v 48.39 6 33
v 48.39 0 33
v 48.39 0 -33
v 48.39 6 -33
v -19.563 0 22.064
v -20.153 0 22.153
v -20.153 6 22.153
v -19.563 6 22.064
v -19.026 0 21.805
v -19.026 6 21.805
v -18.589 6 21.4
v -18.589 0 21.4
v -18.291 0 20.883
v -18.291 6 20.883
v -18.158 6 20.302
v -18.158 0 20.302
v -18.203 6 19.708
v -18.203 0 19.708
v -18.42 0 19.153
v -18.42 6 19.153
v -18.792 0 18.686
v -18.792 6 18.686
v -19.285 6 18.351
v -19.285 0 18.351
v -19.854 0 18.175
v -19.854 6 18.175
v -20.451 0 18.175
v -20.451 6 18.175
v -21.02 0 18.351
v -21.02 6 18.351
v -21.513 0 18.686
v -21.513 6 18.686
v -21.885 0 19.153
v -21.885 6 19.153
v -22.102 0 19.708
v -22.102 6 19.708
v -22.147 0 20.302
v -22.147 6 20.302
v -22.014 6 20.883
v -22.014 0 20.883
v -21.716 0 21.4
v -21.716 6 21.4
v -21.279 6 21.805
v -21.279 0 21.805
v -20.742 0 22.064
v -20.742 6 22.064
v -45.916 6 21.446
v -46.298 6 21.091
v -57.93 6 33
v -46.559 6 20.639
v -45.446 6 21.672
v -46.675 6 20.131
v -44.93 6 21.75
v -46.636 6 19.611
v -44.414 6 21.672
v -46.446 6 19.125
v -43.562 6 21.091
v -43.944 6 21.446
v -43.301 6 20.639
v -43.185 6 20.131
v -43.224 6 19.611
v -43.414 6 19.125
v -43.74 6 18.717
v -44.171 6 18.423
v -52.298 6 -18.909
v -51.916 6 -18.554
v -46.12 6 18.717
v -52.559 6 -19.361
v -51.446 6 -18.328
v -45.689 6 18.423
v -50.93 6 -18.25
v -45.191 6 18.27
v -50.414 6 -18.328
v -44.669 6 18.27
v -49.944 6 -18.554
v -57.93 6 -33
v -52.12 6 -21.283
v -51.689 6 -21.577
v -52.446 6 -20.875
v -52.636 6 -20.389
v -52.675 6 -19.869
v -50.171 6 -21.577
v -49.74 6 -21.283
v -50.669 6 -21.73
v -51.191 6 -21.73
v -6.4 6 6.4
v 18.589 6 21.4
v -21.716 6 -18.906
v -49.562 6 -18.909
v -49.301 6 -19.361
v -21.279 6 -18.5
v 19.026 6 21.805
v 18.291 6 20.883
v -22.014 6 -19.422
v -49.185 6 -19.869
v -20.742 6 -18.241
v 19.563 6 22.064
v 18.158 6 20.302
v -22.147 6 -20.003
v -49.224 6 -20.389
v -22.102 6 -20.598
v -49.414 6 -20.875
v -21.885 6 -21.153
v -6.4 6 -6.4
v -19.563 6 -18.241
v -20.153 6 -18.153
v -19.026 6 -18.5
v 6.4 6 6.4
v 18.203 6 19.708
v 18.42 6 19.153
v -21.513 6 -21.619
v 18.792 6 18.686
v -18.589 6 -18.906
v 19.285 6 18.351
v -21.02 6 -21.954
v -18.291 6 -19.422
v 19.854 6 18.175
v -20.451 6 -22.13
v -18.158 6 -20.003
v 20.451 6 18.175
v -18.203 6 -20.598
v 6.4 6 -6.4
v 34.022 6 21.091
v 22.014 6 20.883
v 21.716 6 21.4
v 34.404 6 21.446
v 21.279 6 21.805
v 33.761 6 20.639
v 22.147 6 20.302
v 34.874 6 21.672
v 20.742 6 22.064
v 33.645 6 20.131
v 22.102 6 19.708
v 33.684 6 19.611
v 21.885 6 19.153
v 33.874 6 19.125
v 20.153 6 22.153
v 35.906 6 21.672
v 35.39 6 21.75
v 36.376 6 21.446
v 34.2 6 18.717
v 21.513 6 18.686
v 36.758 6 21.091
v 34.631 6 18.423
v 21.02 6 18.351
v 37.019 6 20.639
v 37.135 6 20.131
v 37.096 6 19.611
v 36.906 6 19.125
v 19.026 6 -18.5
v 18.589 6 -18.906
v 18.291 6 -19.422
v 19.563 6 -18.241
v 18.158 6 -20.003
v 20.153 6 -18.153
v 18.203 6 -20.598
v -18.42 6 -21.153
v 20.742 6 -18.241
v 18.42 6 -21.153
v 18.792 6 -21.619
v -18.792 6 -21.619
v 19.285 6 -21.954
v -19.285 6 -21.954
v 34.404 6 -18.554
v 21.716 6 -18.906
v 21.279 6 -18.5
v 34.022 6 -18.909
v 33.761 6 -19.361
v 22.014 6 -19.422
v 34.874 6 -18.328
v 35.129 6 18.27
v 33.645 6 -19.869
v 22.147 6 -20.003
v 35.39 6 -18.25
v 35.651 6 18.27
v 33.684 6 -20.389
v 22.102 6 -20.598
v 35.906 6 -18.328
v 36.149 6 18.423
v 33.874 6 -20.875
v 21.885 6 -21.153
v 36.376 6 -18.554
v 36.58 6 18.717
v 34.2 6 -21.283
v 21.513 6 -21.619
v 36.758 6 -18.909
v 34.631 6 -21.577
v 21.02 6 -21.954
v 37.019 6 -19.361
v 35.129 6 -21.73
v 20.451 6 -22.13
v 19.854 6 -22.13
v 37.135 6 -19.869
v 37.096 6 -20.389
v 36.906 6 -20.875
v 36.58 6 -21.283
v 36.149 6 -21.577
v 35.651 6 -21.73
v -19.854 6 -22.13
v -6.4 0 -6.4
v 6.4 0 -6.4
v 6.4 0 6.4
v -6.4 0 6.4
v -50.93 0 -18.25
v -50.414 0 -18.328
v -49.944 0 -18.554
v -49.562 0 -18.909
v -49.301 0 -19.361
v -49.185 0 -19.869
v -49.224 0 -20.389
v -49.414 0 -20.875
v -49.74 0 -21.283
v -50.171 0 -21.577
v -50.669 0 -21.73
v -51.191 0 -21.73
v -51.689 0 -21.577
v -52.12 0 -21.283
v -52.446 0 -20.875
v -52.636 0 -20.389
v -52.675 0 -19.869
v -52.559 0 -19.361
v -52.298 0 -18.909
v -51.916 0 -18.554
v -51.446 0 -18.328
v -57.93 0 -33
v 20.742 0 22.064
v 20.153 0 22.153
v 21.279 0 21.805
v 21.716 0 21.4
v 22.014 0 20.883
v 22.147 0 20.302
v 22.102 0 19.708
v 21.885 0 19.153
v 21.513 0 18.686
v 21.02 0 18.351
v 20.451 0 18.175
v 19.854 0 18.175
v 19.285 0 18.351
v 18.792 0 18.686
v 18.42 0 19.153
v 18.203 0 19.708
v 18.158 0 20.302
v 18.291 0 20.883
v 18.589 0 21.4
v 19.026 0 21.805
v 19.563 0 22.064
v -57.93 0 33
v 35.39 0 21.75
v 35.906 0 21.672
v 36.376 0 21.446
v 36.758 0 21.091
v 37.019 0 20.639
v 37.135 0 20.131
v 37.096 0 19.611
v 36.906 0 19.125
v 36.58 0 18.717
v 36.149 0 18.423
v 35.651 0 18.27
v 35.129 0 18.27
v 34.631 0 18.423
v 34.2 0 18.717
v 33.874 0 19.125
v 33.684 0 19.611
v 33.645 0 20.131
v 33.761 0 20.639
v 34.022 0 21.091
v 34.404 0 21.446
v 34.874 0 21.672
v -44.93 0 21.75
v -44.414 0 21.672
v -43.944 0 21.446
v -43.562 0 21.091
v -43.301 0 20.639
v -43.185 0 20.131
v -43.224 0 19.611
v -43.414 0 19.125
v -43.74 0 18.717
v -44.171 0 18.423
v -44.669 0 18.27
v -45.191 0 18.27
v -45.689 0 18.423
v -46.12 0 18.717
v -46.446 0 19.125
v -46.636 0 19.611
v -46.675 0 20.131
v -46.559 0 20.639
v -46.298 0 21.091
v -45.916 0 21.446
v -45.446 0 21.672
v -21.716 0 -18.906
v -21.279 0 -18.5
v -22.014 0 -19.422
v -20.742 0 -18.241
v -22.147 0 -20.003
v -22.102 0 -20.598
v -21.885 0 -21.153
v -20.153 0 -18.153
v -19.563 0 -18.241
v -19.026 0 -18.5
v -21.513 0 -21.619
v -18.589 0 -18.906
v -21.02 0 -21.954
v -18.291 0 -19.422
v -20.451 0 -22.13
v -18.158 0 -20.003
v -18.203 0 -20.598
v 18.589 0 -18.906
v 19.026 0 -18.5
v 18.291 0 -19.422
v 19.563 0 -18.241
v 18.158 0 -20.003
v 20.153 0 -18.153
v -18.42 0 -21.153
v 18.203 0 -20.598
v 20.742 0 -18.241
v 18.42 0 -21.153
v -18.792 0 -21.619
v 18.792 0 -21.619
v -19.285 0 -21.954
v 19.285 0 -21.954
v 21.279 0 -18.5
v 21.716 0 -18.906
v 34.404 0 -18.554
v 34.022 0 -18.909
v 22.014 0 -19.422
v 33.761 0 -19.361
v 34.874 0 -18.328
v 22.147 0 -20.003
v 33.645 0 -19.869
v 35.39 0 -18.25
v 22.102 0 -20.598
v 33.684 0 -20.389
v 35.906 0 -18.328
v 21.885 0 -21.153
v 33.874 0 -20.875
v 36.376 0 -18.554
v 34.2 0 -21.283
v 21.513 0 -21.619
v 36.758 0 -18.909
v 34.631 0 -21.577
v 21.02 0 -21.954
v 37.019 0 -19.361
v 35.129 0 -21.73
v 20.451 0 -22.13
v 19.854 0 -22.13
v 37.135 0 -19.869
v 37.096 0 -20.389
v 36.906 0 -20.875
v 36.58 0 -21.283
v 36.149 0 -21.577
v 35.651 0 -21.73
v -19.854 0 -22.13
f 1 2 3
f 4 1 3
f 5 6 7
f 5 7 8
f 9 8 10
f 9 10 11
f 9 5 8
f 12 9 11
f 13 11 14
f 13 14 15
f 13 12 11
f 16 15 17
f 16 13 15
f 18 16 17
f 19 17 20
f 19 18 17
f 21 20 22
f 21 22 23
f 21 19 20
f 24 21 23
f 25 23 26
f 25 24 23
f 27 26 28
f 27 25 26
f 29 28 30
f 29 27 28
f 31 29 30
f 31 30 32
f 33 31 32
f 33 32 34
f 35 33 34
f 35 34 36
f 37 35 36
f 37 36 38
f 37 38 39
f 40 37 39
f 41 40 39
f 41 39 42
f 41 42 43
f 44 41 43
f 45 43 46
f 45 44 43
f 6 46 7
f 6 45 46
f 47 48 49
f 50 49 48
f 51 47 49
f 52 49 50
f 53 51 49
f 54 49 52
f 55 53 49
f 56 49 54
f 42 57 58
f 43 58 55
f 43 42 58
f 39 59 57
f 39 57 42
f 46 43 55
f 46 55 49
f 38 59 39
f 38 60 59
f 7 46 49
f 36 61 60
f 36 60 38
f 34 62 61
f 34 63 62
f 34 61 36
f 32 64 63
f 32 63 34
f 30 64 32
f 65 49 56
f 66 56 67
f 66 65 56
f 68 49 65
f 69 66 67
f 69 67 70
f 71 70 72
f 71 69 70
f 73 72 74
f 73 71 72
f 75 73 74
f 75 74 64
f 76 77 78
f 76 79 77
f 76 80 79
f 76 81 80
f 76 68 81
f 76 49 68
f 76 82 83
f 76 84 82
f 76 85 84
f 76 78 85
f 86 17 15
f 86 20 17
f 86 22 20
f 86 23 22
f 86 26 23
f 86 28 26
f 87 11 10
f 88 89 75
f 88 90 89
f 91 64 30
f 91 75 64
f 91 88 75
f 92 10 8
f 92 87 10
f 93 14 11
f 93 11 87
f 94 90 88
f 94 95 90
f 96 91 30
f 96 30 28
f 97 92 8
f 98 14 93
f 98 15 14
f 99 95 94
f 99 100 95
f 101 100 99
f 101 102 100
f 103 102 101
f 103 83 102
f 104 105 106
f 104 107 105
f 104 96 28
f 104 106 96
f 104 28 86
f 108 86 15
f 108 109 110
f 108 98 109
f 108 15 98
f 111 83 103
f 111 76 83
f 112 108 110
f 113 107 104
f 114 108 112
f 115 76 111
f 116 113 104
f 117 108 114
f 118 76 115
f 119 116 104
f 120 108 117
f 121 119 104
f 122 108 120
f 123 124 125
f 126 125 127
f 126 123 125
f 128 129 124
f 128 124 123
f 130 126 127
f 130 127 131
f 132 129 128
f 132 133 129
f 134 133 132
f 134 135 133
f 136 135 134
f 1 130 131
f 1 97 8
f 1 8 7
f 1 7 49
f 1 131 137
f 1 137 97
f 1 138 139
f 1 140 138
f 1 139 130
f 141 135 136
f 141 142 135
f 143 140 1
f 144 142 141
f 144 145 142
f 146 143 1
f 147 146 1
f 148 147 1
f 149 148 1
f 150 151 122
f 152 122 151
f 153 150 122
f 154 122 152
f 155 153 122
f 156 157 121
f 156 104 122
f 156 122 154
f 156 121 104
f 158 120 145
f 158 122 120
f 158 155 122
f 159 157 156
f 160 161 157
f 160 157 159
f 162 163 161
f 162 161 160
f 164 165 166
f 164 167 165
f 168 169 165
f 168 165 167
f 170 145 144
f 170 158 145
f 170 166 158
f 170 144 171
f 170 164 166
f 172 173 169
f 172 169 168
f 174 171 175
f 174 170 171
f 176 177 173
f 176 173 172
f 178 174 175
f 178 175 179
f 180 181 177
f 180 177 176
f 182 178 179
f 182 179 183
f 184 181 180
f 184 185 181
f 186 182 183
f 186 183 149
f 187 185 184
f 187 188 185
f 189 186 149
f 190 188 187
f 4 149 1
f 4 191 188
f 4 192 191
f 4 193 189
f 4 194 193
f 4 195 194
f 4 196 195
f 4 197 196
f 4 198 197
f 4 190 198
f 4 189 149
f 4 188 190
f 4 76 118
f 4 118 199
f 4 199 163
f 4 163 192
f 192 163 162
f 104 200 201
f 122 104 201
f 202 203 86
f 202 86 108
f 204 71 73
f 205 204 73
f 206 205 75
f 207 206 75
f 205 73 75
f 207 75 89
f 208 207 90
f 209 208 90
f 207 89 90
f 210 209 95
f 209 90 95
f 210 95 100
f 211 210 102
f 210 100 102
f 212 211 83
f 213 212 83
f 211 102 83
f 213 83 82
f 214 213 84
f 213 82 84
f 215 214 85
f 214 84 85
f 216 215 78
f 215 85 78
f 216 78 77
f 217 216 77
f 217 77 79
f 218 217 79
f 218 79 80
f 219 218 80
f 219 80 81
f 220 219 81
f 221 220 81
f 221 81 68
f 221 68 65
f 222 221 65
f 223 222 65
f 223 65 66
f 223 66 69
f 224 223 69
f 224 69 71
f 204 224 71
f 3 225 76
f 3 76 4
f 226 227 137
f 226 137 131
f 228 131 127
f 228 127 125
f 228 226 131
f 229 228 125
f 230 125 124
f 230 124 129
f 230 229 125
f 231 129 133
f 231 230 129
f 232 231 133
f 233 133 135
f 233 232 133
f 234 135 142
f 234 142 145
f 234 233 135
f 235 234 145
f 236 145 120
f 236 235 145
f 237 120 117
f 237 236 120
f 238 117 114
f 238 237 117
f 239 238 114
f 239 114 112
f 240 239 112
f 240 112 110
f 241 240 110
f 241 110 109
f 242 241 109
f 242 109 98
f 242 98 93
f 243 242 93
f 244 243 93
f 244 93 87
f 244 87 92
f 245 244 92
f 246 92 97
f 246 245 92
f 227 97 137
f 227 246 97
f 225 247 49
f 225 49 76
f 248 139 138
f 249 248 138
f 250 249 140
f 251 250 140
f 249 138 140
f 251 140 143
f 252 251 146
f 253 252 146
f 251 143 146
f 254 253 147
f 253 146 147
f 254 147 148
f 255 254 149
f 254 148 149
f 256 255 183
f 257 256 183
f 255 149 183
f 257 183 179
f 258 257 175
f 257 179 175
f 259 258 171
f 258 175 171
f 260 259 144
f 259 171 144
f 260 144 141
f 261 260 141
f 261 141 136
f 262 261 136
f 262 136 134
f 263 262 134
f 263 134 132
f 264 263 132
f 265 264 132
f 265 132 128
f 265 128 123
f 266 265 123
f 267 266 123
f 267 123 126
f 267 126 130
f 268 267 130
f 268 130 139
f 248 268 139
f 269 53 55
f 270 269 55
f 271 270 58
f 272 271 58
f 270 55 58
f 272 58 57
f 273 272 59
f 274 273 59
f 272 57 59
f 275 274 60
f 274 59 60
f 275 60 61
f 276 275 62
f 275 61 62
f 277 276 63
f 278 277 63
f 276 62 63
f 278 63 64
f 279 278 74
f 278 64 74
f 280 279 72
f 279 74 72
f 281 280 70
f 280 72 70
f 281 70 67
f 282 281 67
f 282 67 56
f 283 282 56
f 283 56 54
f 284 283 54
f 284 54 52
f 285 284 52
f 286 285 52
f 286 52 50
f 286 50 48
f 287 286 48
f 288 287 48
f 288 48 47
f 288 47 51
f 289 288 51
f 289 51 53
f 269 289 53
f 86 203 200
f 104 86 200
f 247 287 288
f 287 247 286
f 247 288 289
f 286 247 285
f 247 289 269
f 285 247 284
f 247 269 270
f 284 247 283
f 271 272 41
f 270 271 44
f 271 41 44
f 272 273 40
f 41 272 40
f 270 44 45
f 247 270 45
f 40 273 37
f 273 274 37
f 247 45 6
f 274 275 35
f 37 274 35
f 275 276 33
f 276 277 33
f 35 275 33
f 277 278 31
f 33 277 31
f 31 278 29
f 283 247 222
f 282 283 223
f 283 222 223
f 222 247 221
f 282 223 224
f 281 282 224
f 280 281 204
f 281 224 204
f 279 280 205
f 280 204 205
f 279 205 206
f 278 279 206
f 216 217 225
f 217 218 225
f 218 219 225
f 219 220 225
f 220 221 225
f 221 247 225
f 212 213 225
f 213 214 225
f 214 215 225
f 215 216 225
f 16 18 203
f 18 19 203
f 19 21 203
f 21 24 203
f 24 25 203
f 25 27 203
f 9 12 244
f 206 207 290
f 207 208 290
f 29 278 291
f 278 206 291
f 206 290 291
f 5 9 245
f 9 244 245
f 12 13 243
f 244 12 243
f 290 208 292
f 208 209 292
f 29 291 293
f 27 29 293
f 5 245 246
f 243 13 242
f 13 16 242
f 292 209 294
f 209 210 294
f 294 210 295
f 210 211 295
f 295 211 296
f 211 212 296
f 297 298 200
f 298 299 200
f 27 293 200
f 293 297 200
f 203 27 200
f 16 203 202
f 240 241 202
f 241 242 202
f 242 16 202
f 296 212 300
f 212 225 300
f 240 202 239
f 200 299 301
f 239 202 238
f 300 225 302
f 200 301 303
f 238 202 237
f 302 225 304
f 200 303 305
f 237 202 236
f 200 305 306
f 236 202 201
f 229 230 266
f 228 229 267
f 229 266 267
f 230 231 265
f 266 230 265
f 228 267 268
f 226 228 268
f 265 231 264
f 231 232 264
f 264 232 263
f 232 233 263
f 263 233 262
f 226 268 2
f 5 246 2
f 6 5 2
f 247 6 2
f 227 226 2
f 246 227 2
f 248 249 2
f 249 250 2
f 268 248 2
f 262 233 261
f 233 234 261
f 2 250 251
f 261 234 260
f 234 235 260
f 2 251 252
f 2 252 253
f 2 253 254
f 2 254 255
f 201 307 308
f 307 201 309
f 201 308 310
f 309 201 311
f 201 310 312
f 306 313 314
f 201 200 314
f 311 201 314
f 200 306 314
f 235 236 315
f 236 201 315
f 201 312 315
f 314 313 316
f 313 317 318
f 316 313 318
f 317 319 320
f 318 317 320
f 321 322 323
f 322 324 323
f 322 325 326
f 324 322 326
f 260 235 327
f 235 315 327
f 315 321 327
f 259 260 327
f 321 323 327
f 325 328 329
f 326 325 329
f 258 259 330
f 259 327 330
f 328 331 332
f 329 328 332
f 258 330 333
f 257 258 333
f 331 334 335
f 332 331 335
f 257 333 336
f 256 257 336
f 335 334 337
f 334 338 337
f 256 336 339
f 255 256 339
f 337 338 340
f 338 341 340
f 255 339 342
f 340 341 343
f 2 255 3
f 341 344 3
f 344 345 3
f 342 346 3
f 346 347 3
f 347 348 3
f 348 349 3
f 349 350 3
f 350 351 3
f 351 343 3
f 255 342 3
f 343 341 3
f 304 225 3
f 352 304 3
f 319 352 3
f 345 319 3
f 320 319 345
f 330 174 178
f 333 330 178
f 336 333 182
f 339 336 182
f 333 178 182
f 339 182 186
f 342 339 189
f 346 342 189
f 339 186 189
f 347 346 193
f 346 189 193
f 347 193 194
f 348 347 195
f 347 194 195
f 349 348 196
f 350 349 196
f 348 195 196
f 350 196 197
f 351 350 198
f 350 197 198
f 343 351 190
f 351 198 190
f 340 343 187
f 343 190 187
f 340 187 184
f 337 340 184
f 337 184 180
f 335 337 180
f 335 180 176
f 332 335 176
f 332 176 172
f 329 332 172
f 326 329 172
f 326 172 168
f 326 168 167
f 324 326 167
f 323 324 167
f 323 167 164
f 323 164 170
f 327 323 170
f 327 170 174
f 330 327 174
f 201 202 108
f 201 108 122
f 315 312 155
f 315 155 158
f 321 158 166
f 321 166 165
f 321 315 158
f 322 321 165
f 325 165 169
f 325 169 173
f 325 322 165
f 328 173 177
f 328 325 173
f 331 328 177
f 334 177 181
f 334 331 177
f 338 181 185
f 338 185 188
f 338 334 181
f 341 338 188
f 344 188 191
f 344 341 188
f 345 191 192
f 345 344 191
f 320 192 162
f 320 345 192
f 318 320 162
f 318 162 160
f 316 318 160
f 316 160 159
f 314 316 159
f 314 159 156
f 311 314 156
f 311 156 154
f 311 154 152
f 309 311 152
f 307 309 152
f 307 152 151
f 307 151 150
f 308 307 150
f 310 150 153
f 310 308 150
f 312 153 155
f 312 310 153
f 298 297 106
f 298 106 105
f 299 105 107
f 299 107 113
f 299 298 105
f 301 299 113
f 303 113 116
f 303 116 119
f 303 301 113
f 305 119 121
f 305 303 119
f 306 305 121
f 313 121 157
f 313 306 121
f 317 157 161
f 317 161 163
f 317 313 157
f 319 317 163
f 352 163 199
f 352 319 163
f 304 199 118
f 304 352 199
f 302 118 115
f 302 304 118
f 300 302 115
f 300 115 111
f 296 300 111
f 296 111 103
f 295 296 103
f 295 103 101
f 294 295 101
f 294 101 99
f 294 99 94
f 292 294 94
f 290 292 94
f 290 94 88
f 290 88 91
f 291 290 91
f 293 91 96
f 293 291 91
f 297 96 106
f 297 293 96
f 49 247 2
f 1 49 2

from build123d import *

# Parameters (mm, degrees)
SKETCH1_W           = 106.32
SKETCH1_H           = 66
SKETCH1_R           = 2
SKETCH1_W_2         = 12.8
SKETCH1_H_2         = 12.8
BOSS_EXTRUDE1_DEPTH = 6
SKETCH4_R           = 1.75
CUT_EXTRUDE1_DEPTH  = 67.939412158


with BuildPart() as part:
    # Sketch1 → Boss-Extrude1 (new body)
    with BuildSketch(Plane(origin=(0, 0, 0), x_dir=(1, 0, 0), z_dir=(0, 1, 0))):
        with Locations((-4.77, 0)):
            Rectangle(SKETCH1_W, SKETCH1_H)
        with Locations(Location((20.152543264, -20.152543264, 0), (0, 0, 270))):
            Circle(SKETCH1_R, mode=Mode.SUBTRACT)
        with Locations(Location((20.152543264, 20.152543264, 0), (0, 0, 270))):
            Circle(SKETCH1_R, mode=Mode.SUBTRACT)
        with Locations(Location((-20.152543264, -20.152543264, 0), (0, 0, 270))):
            Circle(SKETCH1_R, mode=Mode.SUBTRACT)
        with Locations(Location((-20.152543264, 20.152543264, 0), (0, 0, 270))):
            Circle(SKETCH1_R, mode=Mode.SUBTRACT)
        Rectangle(SKETCH1_W_2, SKETCH1_H_2, mode=Mode.SUBTRACT)
    extrude(amount=BOSS_EXTRUDE1_DEPTH)

    # Sketch4 → Cut-Extrude1 (cut, through all)
    with BuildSketch(Plane(origin=(0, 6, 0), x_dir=(1, 0, 0), z_dir=(0, 1, 0))):
        with Locations(Location((-50.93, 20, 0), (0, 0, 270))):
            Circle(SKETCH4_R)
        with Locations(Location((-44.93, -20, 0), (0, 0, 270))):
            Circle(SKETCH4_R)
        with Locations(Location((35.39, -20, 0), (0, 0, 270))):
            Circle(SKETCH4_R)
        with Locations(Location((35.39, 20, 0), (0, 0, 270))):
            Circle(SKETCH4_R)
    extrude(amount=-CUT_EXTRUDE1_DEPTH, mode=Mode.SUBTRACT)


solid = part.part
